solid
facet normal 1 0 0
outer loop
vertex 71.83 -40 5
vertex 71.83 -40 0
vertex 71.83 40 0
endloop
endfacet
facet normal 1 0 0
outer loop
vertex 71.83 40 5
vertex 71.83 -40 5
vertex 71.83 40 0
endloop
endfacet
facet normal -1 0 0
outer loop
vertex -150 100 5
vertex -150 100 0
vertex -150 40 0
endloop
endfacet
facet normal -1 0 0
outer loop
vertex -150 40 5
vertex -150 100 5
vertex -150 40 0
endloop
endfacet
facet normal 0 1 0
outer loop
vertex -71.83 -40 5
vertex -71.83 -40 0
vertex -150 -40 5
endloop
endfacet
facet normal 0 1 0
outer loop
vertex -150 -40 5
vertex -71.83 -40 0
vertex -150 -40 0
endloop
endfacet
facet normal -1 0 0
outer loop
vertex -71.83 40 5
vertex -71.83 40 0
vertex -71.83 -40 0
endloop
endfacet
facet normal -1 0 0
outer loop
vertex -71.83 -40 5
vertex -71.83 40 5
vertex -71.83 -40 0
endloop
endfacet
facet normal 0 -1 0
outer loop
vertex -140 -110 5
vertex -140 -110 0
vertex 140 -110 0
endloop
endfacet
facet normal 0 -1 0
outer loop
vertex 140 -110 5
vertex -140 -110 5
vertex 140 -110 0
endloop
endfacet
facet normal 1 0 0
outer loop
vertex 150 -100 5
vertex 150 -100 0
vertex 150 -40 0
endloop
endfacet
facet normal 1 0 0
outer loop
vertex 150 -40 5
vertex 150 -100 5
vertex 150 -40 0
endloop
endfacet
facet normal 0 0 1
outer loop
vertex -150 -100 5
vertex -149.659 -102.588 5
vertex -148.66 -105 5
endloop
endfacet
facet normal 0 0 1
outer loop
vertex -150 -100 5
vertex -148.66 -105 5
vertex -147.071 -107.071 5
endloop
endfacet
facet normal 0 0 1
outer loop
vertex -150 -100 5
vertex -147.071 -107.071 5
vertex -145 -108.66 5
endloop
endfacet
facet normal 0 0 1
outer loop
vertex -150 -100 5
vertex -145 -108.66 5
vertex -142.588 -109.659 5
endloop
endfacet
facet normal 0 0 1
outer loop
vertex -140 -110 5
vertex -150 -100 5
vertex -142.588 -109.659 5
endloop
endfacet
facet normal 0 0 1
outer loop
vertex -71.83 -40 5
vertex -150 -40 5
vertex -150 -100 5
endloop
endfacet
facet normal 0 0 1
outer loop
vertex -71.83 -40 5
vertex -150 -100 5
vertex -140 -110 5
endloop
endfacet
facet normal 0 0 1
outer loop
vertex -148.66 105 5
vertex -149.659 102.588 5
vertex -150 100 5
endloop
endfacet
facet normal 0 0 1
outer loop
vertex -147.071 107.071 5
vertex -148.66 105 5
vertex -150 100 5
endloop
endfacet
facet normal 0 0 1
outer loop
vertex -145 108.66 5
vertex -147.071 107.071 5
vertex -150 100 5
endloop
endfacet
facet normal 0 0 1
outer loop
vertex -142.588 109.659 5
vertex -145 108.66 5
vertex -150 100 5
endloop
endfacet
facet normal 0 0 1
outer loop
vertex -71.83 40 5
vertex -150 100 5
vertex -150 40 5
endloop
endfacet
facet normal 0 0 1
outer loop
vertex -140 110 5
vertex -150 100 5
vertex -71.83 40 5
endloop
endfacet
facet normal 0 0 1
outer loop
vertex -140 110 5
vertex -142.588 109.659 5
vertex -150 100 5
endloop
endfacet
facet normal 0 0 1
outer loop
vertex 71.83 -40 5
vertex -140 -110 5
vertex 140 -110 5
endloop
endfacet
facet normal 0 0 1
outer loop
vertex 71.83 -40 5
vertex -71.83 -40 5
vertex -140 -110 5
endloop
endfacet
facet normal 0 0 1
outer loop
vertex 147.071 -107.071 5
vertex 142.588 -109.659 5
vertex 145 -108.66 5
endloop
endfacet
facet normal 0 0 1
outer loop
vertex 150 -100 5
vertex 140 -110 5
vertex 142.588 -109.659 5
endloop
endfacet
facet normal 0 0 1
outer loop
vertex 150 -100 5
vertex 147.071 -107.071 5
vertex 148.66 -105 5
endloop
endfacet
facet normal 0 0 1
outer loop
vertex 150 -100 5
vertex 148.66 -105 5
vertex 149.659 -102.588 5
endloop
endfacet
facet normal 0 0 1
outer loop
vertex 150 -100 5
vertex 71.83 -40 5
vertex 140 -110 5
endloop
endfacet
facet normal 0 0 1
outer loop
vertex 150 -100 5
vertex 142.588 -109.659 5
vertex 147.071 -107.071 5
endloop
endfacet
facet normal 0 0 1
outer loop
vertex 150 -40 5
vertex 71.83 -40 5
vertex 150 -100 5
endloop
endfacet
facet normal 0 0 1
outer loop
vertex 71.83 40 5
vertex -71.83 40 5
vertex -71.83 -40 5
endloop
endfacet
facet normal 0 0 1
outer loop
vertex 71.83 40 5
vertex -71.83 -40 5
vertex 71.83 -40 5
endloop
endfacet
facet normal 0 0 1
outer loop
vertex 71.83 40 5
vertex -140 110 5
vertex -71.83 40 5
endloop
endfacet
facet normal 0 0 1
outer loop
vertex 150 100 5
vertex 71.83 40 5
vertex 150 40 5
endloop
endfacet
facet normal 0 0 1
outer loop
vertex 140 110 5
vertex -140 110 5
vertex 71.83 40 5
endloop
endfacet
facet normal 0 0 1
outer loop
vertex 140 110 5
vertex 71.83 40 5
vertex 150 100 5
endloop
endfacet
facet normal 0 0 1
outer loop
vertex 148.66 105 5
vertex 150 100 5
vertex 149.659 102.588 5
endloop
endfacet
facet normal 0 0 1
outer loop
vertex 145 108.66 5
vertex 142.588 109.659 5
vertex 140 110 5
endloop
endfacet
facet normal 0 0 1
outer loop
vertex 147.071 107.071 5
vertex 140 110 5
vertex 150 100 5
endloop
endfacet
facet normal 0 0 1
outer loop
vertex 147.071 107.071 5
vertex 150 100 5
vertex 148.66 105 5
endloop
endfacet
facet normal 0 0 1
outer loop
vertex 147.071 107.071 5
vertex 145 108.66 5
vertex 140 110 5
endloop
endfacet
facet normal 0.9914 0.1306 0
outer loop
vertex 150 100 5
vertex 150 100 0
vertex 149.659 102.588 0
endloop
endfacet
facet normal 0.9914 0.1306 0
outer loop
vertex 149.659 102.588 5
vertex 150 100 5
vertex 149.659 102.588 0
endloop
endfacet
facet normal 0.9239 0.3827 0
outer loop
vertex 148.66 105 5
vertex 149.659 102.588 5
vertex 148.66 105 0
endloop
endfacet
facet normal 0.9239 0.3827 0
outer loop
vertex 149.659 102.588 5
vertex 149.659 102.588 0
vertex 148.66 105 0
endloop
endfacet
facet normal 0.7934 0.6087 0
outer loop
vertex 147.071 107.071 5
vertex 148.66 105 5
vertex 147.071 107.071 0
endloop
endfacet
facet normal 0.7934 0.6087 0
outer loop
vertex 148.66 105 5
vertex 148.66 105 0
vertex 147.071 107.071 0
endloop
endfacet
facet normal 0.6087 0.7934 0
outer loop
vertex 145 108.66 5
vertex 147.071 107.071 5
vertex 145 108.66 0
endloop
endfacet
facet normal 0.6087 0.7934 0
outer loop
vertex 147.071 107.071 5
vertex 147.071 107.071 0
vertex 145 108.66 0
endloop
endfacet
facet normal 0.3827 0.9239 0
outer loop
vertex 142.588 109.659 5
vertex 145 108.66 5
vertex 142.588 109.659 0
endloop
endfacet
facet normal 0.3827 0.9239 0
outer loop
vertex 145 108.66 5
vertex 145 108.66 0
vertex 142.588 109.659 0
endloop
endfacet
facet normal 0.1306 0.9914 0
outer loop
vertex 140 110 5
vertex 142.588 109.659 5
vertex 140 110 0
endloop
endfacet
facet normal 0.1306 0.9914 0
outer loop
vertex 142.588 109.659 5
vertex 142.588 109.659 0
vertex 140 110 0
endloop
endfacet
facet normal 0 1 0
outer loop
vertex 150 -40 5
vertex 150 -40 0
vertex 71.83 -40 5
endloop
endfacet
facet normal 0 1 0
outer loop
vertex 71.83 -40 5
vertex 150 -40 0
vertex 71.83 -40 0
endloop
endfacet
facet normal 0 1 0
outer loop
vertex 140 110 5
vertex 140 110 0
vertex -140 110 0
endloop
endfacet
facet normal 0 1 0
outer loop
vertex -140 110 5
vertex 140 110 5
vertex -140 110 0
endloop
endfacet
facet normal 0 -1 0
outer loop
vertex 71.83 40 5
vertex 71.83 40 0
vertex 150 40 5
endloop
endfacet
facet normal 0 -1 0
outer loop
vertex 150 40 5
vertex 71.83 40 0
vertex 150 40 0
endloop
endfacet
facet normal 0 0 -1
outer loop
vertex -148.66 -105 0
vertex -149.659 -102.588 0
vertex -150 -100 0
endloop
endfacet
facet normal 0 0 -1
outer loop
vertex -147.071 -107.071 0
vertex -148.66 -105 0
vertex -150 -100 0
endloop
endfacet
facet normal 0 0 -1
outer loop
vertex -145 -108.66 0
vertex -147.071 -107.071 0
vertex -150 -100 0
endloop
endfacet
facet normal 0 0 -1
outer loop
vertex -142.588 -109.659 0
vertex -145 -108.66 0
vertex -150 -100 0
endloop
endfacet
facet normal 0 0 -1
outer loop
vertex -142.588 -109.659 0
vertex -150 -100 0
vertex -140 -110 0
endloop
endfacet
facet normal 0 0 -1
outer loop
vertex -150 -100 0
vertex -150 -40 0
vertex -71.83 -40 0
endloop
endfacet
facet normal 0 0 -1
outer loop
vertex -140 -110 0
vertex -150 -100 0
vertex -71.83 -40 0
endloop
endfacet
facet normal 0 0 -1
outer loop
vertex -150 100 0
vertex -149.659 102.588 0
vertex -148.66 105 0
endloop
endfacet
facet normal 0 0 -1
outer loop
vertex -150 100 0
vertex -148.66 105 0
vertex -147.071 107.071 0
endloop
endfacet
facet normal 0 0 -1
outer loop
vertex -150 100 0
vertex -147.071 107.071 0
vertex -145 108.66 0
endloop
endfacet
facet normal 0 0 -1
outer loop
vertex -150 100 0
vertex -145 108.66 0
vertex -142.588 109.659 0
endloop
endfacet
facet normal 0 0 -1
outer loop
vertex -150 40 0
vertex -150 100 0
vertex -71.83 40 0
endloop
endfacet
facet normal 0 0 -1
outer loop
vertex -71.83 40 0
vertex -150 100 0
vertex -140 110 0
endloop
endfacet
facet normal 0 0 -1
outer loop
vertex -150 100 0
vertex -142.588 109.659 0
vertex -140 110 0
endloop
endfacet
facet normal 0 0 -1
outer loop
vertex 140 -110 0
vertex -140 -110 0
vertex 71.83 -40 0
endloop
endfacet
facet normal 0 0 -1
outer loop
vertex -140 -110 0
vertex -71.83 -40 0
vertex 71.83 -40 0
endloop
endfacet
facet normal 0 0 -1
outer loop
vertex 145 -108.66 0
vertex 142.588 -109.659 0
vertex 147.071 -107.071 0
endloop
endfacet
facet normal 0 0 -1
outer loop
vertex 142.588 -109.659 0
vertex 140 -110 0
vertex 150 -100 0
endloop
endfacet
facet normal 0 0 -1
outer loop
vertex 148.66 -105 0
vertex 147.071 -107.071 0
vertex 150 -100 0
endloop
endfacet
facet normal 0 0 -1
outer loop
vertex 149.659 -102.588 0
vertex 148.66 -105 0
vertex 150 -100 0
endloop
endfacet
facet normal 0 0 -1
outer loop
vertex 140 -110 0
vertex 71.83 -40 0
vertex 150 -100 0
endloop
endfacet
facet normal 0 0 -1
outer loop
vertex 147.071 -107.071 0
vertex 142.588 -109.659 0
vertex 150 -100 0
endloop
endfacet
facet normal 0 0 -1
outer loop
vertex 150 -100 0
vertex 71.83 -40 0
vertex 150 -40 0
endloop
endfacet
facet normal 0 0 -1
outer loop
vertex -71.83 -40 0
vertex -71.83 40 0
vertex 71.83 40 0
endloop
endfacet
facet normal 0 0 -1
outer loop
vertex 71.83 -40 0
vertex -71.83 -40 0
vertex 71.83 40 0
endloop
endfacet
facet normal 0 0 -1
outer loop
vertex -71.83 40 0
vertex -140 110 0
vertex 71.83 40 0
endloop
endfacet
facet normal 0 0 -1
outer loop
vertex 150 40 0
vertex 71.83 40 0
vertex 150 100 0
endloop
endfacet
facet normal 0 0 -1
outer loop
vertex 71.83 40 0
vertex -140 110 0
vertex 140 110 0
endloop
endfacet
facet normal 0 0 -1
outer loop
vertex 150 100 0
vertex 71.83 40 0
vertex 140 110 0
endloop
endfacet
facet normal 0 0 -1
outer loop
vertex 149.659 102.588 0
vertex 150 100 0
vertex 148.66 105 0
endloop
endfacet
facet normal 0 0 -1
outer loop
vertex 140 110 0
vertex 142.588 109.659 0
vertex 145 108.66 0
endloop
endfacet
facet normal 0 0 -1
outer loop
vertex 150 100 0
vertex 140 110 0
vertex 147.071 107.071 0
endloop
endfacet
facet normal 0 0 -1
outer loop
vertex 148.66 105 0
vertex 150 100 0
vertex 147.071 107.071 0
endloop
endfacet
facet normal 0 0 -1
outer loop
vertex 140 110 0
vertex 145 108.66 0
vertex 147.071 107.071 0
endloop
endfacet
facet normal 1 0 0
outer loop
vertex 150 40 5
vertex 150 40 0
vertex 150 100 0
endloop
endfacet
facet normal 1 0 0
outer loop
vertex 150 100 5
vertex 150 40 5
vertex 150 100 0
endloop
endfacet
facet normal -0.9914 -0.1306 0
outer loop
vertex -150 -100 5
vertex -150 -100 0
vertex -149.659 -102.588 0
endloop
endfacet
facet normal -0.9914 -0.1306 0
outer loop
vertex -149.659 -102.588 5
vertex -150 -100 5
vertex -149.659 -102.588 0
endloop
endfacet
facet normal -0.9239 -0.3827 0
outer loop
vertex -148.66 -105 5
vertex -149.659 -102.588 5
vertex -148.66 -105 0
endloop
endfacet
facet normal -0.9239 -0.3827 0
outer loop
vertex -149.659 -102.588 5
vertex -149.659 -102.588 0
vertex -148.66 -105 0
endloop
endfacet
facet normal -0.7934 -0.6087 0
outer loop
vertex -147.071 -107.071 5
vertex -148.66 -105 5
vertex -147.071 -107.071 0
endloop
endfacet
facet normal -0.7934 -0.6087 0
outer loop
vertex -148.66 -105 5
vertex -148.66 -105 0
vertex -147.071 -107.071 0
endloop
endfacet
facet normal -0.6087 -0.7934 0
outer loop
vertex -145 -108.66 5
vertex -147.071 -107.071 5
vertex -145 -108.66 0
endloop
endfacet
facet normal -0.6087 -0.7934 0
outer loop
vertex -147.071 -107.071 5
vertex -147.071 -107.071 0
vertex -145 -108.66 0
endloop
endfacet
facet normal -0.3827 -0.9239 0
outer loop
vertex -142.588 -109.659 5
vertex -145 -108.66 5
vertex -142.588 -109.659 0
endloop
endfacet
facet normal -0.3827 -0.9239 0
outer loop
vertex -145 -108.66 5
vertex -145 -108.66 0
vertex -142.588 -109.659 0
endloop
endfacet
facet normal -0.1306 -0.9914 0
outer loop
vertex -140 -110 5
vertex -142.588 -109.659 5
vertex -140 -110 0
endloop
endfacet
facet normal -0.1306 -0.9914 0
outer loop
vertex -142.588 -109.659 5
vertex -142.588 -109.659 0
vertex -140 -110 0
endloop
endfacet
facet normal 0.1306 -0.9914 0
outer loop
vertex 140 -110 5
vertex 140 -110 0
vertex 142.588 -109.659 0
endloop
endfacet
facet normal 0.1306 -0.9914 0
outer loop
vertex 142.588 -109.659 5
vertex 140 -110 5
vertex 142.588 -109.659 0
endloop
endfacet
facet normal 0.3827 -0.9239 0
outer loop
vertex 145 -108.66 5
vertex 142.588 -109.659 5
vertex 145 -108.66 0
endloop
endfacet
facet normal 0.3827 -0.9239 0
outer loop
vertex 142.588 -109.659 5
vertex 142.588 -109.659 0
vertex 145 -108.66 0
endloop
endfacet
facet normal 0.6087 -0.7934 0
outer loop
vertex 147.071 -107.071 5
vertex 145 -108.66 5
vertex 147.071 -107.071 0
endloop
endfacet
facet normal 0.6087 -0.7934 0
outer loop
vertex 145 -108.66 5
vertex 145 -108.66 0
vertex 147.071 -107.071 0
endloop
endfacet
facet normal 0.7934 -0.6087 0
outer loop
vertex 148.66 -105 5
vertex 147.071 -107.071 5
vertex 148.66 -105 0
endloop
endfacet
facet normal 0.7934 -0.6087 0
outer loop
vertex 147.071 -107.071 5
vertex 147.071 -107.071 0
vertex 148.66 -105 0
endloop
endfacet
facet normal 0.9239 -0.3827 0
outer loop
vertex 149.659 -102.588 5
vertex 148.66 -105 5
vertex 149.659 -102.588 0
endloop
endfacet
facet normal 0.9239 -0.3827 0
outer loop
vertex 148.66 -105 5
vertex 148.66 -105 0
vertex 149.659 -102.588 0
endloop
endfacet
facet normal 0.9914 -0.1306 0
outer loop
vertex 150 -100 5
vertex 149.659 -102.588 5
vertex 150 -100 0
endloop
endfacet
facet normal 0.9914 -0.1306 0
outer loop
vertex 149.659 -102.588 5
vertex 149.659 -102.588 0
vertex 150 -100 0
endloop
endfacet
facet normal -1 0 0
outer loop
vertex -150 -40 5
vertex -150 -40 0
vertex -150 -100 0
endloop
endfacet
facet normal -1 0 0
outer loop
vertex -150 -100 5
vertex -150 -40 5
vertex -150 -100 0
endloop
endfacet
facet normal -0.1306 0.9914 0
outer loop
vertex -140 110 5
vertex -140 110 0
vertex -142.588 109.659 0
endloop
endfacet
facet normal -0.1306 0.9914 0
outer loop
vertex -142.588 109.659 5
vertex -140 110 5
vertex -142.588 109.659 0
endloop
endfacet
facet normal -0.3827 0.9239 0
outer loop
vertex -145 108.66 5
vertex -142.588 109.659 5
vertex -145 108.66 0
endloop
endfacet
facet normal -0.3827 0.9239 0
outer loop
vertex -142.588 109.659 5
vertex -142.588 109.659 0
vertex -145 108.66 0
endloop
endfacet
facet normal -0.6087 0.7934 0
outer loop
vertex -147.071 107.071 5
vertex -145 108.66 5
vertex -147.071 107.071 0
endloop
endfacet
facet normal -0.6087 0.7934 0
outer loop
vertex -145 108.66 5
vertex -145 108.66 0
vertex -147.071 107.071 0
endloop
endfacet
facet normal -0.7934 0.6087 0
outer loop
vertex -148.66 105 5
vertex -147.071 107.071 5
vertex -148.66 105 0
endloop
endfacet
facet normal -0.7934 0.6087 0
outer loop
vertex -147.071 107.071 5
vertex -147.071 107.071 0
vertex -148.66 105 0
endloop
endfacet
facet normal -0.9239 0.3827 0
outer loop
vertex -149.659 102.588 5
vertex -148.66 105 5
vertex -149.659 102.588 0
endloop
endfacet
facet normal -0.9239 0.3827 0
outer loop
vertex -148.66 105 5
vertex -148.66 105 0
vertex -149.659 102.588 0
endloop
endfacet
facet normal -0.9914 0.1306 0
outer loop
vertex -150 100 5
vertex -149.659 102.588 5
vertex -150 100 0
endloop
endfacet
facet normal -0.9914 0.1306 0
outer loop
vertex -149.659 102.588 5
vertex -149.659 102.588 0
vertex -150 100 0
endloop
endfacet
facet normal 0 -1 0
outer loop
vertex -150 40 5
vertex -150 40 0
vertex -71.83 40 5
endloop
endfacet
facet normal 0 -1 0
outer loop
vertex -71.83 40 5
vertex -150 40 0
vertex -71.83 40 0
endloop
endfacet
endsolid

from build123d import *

# Parameters (mm, degrees)
BOSS_EXTRUDE1_DEPTH = 5


with BuildPart() as part:
    # Sketch1 → Boss-Extrude1 (new body)
    with BuildSketch(Plane.XY):
        with BuildLine():
            Line((-150, 40), (-71.83, 40))
            Line((-71.83, 40), (-71.83, -40))
            Line((-71.83, -40), (-150, -40))
            Line((-150, -40), (-150, -100))
            ThreePointArc((-150, -100), (-147.071067812, -107.071067812), (-140, -110))
            Line((-140, -110), (140, -110))
            ThreePointArc((140, -110), (147.071067812, -107.071067812), (150, -100))
            Line((150, -100), (150, -40))
            Line((150, -40), (71.83, -40))
            Line((71.83, -40), (71.83, 40))
            Line((71.83, 40), (150, 40))
            Line((150, 40), (150, 100))
            ThreePointArc((150, 100), (147.071067812, 107.071067812), (140, 110))
            Line((140, 110), (-140, 110))
            ThreePointArc((-140, 110), (-147.071067812, 107.071067812), (-150, 100))
            Line((-150, 100), (-150, 40))
        make_face()
    extrude(amount=BOSS_EXTRUDE1_DEPTH)


solid = part.part
